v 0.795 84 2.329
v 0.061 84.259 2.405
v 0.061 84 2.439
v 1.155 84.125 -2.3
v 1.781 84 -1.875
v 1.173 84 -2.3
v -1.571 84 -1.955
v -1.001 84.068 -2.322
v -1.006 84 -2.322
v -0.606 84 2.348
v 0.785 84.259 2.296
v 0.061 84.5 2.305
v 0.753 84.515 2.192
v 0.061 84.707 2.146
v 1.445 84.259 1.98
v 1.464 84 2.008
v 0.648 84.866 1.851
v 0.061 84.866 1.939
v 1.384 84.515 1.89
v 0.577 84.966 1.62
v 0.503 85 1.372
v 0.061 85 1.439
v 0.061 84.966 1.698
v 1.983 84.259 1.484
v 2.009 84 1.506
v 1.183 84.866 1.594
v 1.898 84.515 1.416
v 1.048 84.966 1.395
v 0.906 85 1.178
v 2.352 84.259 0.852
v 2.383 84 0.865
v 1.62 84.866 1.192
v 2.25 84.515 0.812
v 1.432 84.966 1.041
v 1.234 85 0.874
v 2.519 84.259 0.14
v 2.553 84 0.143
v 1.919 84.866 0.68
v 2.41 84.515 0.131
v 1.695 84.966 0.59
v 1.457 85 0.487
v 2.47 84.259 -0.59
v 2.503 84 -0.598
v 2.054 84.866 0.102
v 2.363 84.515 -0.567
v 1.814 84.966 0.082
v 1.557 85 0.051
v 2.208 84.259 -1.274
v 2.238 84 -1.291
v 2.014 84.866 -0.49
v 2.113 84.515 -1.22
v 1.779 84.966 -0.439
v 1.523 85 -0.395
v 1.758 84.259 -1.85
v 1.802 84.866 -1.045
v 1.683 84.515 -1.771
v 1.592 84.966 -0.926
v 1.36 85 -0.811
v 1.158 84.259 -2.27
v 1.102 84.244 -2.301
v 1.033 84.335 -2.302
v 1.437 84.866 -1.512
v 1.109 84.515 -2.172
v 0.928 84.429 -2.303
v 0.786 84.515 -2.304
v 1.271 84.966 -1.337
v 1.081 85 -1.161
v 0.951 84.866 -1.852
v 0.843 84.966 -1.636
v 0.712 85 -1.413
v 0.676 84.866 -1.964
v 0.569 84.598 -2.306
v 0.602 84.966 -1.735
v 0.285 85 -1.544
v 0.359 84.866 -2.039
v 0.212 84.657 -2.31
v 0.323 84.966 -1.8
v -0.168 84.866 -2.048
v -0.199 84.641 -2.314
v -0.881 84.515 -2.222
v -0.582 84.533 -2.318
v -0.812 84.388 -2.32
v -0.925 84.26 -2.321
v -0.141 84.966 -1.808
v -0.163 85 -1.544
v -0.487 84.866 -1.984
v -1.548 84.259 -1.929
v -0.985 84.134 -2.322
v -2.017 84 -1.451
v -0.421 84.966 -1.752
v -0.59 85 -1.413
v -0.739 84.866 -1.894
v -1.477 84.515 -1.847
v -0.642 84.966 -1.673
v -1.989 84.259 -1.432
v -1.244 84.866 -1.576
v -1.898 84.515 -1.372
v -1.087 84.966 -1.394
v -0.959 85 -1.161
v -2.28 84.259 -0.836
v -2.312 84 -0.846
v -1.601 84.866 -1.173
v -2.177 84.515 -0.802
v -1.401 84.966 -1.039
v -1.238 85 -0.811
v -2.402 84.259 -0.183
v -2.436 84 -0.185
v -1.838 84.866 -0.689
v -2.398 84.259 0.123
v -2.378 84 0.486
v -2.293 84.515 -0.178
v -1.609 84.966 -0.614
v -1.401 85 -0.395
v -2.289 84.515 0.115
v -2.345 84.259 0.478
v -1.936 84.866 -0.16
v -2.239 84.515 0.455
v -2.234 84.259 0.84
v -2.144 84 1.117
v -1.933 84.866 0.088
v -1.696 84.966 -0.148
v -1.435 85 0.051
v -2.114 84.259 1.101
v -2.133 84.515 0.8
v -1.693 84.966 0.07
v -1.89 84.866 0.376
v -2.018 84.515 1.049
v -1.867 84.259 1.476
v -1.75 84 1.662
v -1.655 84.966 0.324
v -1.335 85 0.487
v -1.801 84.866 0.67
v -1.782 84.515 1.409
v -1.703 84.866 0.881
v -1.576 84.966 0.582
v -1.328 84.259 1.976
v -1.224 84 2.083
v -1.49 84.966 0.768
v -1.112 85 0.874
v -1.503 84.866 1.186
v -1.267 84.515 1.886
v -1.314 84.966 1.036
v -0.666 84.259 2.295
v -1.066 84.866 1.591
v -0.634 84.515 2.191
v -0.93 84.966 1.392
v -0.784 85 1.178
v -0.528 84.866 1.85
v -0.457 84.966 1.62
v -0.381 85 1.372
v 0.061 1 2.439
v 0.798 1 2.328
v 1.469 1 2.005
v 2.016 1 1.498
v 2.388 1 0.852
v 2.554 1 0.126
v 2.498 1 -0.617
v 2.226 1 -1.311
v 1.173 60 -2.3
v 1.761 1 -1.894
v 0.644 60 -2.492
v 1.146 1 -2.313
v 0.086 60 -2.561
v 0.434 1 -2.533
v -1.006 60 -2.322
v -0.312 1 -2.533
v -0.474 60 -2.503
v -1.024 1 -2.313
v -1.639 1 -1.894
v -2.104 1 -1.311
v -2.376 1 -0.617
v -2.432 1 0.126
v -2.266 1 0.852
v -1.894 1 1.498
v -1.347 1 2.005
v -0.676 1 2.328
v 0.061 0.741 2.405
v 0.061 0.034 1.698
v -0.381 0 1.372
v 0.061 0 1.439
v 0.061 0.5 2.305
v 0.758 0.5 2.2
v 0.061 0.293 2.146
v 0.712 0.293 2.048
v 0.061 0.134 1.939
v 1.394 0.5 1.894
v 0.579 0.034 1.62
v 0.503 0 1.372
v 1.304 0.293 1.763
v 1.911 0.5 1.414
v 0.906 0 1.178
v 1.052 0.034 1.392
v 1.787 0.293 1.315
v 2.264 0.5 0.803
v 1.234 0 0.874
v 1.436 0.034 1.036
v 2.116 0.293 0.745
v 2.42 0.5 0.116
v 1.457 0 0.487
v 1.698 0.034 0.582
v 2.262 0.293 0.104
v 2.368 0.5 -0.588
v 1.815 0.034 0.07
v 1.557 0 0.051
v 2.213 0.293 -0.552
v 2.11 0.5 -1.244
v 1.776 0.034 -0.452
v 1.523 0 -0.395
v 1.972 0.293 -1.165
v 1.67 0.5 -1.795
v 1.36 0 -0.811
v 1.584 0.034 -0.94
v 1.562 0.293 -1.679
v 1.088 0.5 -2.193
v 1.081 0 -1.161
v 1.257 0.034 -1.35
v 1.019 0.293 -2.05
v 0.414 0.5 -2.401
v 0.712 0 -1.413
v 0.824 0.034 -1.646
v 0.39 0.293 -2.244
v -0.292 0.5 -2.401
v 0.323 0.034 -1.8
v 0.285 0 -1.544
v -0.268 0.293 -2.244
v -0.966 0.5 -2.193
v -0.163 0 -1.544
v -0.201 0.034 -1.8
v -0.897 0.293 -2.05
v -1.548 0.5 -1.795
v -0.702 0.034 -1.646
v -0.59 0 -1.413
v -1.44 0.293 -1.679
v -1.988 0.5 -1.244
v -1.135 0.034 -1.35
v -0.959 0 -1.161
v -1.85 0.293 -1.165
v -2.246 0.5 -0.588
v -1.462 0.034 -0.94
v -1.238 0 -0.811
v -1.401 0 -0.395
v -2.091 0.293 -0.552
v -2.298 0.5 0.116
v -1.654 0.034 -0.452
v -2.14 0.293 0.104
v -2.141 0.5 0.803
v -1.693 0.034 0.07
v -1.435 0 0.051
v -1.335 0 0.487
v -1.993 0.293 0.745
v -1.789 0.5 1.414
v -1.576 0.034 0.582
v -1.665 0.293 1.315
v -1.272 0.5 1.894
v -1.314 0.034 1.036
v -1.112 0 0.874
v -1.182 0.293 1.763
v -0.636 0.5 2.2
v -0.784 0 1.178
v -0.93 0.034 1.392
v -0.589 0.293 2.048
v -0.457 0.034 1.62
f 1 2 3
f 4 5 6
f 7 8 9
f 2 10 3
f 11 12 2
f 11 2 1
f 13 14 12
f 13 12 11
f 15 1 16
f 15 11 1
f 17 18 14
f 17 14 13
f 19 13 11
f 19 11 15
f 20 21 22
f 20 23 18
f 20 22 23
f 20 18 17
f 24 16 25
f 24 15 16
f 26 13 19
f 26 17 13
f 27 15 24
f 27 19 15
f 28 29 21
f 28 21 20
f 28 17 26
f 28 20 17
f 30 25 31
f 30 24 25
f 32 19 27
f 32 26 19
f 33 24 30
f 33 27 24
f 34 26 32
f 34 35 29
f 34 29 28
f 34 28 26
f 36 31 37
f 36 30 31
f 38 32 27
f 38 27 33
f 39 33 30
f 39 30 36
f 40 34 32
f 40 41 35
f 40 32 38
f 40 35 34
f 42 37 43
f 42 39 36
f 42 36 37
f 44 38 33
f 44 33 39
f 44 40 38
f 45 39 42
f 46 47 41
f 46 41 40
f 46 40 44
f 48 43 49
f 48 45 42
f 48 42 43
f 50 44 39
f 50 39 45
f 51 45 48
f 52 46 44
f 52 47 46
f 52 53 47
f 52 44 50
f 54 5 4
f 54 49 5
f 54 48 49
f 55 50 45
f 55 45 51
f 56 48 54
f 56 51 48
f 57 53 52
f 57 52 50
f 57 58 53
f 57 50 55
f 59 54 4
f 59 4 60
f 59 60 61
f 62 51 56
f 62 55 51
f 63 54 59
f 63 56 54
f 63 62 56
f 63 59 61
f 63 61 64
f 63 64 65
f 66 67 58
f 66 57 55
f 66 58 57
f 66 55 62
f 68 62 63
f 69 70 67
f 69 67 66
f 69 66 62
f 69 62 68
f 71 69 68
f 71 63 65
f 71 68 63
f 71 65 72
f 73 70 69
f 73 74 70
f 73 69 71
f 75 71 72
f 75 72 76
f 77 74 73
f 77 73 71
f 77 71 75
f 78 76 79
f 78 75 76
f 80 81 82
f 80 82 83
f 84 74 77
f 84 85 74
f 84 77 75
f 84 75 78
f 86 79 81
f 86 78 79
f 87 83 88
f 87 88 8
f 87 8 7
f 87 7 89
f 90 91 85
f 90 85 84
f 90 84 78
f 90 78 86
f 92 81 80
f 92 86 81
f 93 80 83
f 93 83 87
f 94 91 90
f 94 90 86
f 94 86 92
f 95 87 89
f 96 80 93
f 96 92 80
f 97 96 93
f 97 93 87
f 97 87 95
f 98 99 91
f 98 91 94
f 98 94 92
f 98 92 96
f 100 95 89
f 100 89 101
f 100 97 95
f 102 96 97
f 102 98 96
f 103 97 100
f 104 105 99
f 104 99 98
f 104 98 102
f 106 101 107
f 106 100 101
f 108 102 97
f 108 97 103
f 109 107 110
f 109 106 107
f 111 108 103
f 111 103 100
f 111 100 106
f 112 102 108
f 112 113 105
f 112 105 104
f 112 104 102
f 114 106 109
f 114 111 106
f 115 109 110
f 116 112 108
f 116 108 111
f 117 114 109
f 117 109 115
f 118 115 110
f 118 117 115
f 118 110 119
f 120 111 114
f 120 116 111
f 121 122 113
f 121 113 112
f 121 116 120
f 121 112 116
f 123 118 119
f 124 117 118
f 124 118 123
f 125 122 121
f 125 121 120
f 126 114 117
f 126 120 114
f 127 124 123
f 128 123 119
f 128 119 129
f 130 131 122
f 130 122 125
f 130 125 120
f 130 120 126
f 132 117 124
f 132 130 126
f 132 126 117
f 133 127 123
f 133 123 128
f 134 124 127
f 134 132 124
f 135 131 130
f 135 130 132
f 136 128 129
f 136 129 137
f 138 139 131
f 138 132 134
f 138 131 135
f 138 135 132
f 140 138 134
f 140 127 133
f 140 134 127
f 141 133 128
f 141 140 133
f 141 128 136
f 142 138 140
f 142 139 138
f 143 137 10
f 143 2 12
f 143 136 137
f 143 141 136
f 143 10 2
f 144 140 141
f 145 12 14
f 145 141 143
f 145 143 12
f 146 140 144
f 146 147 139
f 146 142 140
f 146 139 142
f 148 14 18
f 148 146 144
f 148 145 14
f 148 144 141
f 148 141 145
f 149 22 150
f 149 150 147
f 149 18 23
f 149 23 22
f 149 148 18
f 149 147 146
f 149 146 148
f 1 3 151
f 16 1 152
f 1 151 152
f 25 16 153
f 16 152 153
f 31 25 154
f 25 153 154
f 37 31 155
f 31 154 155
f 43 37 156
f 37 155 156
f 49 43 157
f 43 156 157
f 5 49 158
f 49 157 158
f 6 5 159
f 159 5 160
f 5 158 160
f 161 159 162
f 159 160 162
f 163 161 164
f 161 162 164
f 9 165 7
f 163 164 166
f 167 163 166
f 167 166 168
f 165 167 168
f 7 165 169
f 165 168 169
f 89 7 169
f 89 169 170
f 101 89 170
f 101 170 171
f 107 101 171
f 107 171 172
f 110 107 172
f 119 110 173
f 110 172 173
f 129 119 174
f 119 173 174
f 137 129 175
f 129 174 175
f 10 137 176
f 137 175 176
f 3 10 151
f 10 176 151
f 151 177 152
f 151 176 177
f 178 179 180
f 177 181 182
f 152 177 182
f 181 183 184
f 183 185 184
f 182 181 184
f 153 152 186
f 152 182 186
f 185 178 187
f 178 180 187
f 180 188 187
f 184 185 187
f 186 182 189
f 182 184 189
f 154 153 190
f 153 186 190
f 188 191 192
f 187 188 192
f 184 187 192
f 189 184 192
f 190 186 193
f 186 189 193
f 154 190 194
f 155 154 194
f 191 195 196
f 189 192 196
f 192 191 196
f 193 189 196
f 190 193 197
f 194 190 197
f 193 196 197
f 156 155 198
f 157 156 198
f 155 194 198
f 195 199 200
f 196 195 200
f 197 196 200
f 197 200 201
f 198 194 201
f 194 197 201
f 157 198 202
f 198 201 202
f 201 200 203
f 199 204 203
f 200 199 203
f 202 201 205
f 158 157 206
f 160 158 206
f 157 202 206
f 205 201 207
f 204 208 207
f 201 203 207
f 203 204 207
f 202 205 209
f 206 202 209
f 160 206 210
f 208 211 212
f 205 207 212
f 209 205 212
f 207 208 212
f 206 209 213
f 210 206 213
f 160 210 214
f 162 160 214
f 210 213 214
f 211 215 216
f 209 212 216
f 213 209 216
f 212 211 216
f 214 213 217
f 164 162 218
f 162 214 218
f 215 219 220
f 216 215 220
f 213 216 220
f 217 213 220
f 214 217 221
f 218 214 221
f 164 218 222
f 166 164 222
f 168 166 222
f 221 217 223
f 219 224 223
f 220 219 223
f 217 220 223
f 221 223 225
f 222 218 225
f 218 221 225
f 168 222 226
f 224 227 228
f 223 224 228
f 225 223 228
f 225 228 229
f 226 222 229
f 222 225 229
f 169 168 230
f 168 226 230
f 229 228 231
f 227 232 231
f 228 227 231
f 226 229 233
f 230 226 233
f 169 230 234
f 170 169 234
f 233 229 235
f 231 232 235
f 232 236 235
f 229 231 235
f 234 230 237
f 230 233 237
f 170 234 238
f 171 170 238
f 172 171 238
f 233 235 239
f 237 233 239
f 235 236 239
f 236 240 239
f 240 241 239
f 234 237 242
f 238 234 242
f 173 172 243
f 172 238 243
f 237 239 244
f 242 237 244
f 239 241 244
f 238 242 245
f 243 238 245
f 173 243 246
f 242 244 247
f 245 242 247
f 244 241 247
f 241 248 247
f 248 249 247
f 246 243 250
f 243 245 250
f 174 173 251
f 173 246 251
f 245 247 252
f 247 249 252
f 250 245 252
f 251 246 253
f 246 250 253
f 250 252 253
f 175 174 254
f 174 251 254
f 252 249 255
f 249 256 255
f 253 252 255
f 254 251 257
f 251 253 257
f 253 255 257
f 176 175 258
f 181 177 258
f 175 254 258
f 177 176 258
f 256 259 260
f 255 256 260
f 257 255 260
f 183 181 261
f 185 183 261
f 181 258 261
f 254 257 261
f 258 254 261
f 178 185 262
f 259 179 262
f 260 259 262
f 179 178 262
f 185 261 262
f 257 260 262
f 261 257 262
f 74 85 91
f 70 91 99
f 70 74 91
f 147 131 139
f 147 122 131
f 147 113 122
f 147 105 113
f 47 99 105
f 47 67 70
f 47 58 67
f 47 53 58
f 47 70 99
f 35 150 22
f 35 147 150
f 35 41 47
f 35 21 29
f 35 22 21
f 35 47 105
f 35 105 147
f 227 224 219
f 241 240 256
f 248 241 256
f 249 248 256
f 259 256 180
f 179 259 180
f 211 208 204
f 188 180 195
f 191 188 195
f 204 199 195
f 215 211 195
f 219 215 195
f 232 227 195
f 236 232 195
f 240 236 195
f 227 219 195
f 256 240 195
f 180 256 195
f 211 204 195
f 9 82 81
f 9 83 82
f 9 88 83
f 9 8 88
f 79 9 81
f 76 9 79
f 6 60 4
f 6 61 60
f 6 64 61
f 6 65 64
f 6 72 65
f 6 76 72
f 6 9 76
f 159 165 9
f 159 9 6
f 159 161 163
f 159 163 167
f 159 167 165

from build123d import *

# Parameters (mm, degrees)
SKETCH2_R           = 2.5
BOSS_EXTRUDE1_DEPTH = 85
CUT_EXTRUDE1_START  = -25
CUT_EXTRUDE1_DEPTH  = 25
FILLET1_R           = 1
FILLET2_R           = 1


with BuildPart() as part:
    # Sketch2 → Boss-Extrude1 (new body)
    with BuildSketch(Plane(origin=(0, 0, 0), x_dir=(1, 0, 0), z_dir=(0, 1, 0))):
        with Locations(Location((0.061061942, 0.061061942, 0), (0, 0, 270))):
            Circle(SKETCH2_R)
    extrude(amount=BOSS_EXTRUDE1_DEPTH)

    # Sketch3 → Cut-Extrude1 (cut)
    with BuildSketch(Plane(origin=(0, 85, 0), x_dir=(1, 0, 0), z_dir=(0, 1, 0)).offset(CUT_EXTRUDE1_START)):
        with BuildLine():
            Line((-1.00625914, 2.321775482), (1.173082806, 2.300126389))
            ThreePointArc((1.173082806, 2.300126389), (0.085895154, 2.560938601), (-1.00625914, 2.321775482))
        make_face()
    extrude(amount=CUT_EXTRUDE1_DEPTH, mode=Mode.SUBTRACT)

    # Fillet1
    # the kernel refuses this fillet: 1 mm, written as the material it takes off along each edge
    with BuildSketch(Plane(origin=(0.061061942, 85, -0.061061942), x_dir=(0.5312663336495629, 0, -0.8472048646759243), z_dir=(0.8472048646759243, 0, 0.5312663336495629))) as fillet1_piece_1:
        with BuildLine():
            CenterArc((2.5 - FILLET1_R, -FILLET1_R), FILLET1_R, 0, 90)
            Line((2.5 - FILLET1_R, 0), (2.5, 0))
            Line((2.5, 0), (2.5, -FILLET1_R))
        make_face()
    revolve(axis=Axis((0.061061942, 85, -0.061061942), (0, 1, 0)), revolution_arc=212.091055881, mode=Mode.SUBTRACT)
    with BuildSketch(Plane(origin=(0.061061942, 85, -0.061061942), x_dir=(0, 0, 1), z_dir=(-1, 0, 0))) as fillet1_piece_2:
        with BuildLine():
            CenterArc((2.5 - FILLET1_R, -FILLET1_R), FILLET1_R, 0, 90)
            Line((2.5 - FILLET1_R, 0), (2.5, 0))
            Line((2.5, 0), (2.5, -FILLET1_R))
        make_face()
    revolve(axis=Axis((0.061061942, 85, -0.061061942), (0, 1, 0)), revolution_arc=210.951767977, mode=Mode.SUBTRACT)

    # Fillet2
    fillet2_edges = [part.edges().sort_by_distance(p)[0] for p in [
        (0.061061942, 0, -2.561061942),
    ]]
    fillet(fillet2_edges, radius=FILLET2_R)


solid = part.part
